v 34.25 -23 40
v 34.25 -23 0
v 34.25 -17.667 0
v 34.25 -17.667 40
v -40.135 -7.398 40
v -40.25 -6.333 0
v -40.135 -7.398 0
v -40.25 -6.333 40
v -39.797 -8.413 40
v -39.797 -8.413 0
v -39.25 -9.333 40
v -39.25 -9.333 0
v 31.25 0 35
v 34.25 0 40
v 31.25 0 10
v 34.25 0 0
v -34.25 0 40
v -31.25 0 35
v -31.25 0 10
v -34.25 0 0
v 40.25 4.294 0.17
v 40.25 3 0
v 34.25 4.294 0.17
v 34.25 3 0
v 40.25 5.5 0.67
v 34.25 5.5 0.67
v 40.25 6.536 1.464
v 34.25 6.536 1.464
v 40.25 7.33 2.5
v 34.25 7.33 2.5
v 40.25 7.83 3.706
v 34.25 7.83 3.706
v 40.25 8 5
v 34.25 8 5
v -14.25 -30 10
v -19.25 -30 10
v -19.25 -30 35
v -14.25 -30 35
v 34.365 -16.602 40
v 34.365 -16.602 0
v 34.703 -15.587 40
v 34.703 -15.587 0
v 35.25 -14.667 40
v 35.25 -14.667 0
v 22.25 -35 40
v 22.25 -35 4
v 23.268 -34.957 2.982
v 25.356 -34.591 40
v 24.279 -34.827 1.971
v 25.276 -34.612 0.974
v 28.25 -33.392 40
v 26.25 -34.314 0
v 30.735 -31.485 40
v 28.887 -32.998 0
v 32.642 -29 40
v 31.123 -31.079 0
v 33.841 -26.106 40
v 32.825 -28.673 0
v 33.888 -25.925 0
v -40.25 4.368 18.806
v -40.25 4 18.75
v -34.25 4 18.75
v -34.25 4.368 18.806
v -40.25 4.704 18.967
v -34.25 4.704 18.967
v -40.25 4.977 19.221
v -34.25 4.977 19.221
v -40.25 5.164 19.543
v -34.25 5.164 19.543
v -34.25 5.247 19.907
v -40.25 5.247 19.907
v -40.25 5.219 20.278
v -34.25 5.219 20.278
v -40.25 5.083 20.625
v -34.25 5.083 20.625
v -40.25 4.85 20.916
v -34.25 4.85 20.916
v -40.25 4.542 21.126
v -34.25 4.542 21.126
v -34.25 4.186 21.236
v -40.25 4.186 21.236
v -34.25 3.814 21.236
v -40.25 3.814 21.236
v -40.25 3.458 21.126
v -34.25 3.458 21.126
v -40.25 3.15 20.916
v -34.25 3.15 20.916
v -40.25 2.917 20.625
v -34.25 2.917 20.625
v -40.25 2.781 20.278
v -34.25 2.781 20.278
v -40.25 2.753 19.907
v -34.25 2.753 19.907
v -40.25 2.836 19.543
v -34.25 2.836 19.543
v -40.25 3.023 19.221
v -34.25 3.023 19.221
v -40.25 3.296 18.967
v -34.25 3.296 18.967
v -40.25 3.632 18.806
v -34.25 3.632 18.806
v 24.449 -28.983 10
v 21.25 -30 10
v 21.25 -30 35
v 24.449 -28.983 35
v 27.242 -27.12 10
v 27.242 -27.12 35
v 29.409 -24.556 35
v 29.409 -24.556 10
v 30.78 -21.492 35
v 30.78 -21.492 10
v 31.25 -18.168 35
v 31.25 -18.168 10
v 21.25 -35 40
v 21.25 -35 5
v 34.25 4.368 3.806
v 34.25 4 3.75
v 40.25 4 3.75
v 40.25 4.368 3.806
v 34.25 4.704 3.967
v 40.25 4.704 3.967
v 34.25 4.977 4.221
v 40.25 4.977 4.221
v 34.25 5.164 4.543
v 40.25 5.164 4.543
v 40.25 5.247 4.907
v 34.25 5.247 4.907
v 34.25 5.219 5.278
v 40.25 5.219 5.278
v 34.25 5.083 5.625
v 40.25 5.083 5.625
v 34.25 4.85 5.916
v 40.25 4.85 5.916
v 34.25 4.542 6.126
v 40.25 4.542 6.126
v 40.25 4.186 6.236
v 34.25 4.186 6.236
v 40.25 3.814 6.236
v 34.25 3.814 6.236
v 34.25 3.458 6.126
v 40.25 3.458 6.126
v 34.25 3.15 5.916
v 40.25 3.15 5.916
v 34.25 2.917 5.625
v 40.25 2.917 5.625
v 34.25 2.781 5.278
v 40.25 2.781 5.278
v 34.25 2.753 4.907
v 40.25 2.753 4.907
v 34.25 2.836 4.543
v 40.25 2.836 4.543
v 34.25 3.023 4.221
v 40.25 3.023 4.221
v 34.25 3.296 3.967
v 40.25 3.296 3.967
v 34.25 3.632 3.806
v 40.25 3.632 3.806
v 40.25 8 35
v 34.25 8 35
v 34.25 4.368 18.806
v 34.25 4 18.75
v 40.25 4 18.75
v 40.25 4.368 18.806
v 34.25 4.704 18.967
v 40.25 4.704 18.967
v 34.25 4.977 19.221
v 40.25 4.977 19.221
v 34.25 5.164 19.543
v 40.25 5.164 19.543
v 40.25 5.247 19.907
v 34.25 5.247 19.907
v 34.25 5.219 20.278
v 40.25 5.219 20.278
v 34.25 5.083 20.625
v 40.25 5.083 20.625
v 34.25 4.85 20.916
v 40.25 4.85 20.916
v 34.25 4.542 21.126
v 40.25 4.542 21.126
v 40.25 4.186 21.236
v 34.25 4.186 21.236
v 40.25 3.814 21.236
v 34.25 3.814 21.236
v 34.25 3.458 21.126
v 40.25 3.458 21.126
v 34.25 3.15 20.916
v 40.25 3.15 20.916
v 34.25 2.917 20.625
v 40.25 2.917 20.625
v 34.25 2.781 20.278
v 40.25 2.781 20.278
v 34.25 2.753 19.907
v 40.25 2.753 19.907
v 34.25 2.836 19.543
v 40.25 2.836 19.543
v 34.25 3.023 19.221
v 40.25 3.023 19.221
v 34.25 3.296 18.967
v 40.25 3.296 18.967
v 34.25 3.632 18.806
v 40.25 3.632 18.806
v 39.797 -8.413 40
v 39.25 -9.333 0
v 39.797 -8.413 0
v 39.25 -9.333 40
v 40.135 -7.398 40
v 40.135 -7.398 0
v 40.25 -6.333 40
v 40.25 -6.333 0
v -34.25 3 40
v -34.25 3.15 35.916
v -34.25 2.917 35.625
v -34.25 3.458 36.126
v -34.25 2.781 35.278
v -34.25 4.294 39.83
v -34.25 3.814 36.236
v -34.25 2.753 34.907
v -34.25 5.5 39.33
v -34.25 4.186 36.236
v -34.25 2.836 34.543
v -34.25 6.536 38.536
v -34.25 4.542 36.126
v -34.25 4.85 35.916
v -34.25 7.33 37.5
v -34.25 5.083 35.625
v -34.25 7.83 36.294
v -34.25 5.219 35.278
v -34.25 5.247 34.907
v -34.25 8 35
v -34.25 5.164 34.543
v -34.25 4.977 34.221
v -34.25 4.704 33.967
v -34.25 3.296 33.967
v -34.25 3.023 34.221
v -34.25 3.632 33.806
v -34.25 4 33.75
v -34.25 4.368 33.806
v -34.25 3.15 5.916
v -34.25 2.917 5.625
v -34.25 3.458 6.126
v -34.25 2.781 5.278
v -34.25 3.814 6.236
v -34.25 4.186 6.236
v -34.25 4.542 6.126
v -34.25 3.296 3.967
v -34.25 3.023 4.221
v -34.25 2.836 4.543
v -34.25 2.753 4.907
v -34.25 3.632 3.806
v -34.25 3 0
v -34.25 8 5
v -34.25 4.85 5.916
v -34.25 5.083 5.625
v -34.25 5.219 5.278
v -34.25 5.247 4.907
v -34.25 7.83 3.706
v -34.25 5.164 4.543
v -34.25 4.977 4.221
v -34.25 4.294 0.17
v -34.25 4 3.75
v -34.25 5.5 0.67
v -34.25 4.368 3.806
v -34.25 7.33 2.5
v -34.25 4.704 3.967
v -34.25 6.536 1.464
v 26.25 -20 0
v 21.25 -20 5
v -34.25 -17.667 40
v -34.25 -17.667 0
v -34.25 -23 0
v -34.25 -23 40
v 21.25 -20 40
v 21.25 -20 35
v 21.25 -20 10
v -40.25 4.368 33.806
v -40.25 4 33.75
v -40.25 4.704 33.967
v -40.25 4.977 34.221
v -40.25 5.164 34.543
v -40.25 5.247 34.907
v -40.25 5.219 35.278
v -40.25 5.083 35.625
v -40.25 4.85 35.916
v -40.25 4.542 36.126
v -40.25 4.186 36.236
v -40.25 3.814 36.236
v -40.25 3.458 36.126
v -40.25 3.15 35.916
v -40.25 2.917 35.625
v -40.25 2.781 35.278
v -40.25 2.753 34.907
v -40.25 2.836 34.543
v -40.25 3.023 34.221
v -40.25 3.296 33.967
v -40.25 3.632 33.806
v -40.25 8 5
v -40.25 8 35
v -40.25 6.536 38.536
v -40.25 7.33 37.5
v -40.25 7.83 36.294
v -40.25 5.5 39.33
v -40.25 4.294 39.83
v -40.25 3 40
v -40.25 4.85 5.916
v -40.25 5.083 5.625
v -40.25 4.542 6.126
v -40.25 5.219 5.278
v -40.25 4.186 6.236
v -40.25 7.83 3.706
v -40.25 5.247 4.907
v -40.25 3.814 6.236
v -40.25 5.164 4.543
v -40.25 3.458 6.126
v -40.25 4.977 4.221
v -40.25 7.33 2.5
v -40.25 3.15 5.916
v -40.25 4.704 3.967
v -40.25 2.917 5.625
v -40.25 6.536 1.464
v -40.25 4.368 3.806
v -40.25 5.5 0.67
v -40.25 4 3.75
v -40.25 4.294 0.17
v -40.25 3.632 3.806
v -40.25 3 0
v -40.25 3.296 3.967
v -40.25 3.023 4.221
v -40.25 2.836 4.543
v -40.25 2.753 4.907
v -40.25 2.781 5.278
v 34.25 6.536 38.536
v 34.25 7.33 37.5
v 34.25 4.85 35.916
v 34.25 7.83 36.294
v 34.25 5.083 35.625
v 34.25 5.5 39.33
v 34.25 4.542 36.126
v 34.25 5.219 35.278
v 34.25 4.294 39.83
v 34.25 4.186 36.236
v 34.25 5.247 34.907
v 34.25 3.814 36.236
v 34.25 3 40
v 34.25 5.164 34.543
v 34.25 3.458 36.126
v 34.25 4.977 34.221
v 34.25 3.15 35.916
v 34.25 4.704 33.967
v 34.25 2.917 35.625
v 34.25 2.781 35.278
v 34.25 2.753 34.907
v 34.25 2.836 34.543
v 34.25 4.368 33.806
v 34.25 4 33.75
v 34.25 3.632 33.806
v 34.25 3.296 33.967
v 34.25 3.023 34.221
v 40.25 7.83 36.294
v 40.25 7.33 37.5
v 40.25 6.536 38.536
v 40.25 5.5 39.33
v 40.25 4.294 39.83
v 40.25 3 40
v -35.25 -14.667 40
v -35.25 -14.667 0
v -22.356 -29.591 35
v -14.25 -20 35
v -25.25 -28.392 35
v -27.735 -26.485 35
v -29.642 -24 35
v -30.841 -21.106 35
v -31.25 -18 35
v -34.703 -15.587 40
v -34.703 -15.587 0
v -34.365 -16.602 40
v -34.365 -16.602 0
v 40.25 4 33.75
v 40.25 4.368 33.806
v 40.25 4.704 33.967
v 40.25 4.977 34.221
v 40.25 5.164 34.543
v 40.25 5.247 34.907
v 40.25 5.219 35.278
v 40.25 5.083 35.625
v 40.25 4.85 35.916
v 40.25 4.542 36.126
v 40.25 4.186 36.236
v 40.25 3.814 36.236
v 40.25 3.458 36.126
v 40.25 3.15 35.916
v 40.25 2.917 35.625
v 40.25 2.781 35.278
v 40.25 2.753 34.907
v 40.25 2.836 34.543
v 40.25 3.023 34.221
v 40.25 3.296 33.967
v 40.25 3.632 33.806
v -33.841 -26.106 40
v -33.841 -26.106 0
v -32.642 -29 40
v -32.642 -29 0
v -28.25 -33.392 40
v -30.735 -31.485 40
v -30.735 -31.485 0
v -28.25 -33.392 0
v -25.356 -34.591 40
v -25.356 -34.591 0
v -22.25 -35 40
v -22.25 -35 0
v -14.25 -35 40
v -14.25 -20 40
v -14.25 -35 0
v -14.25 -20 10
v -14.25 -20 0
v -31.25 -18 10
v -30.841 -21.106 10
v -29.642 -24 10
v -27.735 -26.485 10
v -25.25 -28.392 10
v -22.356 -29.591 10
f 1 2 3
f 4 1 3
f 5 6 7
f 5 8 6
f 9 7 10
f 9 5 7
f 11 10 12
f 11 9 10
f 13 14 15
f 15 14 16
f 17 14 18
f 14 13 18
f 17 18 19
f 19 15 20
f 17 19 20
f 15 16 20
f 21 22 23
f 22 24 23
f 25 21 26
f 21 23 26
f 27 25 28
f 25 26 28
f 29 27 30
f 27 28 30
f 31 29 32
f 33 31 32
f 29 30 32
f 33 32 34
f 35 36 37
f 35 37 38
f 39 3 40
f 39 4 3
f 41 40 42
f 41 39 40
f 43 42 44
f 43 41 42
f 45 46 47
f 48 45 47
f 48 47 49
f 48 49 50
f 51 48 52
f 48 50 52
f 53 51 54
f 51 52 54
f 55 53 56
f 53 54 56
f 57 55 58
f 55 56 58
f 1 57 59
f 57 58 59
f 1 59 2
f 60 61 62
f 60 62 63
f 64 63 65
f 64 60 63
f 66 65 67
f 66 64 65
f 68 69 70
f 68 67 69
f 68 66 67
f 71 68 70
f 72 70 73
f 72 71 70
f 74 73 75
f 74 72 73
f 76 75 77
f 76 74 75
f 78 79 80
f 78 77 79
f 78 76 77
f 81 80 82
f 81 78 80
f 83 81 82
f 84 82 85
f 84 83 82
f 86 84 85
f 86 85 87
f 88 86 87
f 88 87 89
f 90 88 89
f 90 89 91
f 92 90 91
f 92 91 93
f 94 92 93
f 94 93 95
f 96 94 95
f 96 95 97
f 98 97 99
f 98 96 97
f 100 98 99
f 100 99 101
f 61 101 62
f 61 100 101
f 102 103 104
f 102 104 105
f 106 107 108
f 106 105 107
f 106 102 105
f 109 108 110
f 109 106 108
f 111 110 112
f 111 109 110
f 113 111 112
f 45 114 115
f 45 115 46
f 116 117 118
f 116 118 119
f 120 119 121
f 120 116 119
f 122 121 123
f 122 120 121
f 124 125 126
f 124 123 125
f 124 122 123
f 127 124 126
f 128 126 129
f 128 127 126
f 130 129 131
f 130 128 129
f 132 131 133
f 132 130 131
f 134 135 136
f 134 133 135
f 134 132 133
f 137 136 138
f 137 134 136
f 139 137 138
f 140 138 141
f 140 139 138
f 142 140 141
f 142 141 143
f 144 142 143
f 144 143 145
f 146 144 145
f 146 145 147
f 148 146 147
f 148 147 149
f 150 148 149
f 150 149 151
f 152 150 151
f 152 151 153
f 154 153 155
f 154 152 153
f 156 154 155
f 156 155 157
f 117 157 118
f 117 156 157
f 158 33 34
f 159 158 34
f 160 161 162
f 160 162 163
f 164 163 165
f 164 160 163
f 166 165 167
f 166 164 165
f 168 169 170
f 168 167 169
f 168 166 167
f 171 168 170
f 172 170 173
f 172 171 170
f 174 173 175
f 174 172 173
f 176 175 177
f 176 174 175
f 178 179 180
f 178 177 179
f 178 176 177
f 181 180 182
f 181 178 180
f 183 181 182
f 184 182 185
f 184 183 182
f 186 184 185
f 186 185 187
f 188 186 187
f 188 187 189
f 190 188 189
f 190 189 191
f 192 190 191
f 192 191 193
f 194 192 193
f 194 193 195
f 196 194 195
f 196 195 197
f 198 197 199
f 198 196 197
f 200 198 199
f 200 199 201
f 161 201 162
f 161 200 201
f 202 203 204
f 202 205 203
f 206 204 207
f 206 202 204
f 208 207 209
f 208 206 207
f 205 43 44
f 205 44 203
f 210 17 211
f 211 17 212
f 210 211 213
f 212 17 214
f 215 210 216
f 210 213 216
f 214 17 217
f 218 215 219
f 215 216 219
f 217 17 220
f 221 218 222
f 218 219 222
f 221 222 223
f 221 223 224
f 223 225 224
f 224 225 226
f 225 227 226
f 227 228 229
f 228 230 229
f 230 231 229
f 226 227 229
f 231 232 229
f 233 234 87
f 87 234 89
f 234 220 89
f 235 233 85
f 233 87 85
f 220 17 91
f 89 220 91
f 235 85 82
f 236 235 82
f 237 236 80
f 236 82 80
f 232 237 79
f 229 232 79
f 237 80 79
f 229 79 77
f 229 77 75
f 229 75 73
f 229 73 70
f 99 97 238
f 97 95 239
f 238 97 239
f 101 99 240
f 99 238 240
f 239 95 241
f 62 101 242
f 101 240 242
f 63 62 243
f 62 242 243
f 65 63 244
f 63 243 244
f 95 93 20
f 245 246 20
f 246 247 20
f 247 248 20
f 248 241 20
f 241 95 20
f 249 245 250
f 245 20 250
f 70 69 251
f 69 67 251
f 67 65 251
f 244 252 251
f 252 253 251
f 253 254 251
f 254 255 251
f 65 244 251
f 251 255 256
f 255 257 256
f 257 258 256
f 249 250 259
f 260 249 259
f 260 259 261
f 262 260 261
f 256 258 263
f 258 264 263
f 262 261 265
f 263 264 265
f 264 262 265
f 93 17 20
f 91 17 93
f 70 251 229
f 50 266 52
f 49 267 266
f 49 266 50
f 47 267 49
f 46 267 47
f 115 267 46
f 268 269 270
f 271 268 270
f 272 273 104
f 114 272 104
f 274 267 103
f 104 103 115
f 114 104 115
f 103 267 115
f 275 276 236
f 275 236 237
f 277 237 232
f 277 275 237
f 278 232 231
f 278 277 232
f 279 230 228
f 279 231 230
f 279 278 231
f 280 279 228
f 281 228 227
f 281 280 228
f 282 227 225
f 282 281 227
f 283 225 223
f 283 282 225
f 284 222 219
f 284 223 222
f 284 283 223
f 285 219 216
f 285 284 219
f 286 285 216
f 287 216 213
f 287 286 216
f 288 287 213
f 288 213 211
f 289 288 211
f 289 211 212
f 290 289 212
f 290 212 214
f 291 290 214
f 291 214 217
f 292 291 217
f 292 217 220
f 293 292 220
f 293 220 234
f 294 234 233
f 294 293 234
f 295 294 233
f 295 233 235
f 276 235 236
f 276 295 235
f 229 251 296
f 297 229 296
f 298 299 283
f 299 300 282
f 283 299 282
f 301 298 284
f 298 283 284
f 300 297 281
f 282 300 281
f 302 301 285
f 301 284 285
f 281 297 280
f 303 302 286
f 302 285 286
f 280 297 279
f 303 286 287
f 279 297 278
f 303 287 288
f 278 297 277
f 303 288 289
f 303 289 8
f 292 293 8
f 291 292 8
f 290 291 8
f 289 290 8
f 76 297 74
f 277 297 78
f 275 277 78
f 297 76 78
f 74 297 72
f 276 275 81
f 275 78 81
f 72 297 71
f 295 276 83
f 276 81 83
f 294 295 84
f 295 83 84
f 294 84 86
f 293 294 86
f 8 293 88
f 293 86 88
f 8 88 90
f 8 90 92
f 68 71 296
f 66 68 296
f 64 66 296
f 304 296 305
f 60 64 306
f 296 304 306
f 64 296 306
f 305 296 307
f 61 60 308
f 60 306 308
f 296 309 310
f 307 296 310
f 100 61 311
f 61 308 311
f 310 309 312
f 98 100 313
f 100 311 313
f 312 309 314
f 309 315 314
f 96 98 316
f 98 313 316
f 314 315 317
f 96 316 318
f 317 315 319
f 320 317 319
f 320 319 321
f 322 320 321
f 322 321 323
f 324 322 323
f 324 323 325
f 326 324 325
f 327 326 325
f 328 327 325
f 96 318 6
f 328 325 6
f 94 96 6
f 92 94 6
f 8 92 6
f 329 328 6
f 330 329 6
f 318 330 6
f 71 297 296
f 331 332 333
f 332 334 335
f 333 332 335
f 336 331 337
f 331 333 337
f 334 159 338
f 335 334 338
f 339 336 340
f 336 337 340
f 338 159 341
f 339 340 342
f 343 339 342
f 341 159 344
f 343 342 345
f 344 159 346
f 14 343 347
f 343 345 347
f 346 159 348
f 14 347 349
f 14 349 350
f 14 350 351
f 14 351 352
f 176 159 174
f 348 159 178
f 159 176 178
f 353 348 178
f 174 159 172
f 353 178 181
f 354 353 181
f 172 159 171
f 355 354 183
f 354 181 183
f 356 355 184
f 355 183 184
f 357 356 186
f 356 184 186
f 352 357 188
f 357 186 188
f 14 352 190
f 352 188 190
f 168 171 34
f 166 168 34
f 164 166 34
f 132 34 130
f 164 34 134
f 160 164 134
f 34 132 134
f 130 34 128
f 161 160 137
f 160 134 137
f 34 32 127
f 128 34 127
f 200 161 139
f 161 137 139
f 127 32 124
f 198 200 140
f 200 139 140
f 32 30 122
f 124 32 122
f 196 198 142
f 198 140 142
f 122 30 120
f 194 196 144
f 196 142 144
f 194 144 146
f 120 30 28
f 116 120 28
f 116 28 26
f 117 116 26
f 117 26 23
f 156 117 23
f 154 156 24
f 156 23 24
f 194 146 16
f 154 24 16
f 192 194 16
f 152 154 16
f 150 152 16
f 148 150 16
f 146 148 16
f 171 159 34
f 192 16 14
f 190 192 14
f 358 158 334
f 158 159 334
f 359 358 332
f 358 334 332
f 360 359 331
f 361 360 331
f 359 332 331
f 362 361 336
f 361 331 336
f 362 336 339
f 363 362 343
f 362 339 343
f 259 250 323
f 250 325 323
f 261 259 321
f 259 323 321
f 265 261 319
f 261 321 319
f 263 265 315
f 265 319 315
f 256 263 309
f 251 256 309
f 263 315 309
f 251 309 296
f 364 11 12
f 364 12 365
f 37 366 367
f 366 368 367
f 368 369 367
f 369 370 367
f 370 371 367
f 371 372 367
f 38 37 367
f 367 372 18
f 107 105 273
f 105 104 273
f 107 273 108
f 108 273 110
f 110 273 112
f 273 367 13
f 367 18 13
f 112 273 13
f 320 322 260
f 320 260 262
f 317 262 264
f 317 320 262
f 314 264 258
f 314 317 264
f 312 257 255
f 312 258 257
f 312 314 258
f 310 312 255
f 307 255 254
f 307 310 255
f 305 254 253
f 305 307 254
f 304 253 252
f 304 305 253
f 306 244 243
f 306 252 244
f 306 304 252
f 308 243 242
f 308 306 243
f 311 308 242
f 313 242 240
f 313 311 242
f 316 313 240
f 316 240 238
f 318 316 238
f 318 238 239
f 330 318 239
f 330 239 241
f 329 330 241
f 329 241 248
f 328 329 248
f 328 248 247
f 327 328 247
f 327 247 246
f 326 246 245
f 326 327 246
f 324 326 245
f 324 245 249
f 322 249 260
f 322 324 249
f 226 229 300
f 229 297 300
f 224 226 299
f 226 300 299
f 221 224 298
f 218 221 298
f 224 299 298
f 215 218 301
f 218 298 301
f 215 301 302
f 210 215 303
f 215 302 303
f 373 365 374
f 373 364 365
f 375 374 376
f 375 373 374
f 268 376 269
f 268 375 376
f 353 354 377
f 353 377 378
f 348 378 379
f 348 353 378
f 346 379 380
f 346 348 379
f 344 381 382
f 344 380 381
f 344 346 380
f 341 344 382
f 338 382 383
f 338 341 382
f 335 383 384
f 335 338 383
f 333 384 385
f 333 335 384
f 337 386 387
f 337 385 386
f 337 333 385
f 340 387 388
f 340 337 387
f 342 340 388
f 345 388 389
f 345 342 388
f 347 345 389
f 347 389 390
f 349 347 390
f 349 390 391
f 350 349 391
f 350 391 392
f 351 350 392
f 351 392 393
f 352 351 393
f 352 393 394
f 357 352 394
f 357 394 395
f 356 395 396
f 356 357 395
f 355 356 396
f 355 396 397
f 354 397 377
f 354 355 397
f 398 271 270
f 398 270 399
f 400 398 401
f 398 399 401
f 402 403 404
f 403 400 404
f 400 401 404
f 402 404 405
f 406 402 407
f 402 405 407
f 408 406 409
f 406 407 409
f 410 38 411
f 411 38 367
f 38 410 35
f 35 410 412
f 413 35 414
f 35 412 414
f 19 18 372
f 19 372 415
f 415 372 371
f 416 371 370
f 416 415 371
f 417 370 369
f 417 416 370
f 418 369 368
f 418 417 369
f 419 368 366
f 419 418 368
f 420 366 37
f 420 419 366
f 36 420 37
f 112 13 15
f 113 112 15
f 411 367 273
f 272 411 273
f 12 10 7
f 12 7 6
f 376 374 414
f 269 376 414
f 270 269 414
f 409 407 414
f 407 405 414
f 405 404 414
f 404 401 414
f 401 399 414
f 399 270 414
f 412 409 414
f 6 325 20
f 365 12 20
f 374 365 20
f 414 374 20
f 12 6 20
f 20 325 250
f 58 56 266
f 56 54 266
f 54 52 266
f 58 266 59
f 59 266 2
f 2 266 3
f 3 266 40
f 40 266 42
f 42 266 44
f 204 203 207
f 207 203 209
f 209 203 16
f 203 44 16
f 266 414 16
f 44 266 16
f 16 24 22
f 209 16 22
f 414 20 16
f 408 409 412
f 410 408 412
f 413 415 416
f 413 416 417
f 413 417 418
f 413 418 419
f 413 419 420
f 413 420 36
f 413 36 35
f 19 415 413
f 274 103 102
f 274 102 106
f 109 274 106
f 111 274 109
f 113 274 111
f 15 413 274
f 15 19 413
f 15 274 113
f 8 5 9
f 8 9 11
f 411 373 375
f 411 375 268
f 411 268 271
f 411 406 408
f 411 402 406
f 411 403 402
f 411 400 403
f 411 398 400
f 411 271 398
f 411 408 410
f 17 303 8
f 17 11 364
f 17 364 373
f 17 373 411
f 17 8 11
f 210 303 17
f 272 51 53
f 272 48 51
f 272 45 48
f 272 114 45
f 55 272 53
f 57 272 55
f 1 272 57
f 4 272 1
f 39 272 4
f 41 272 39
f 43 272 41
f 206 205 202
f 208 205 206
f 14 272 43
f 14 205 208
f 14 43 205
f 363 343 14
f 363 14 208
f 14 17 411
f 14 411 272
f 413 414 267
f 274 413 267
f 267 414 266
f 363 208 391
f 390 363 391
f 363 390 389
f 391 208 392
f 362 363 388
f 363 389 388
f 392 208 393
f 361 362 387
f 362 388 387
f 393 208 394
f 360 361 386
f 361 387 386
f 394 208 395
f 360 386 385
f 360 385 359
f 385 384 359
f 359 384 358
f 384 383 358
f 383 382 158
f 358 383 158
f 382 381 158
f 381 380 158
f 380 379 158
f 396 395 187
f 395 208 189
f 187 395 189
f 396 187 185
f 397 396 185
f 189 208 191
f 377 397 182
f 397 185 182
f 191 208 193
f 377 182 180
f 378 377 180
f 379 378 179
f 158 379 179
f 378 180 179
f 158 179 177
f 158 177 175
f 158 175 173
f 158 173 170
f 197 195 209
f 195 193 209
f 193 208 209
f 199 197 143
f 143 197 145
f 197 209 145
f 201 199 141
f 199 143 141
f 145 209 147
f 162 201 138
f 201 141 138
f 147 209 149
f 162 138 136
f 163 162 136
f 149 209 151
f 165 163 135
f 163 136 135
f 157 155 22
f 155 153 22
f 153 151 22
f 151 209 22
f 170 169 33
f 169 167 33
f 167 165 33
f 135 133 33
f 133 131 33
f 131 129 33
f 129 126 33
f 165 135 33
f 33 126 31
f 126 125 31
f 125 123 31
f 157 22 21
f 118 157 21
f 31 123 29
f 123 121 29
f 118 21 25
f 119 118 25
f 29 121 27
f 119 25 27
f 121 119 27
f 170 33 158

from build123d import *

# Parameters (mm, degrees)
BOSS_EXTRUDE1_DEPTH     = 40
SKETCH2_W               = 35.5
SKETCH2_H               = 25
CUT_EXTRUDE1_DEPTH      = 40
CUT_EXTRUDE2_DEPTH      = 67.671301922
CUT_EXTRUDE2_DEPTH_BACK = 67.671301922
SKETCH3_R               = 1.25
FILLET2_R               = 5
CHAMFER1_SIZE           = 5
SKETCH4_W               = 17
SKETCH4_H               = 25
SKETCH4_W_2             = 10
CUT_EXTRUDE3_DEPTH      = 30
FILLET3_R               = 12


with BuildPart() as part:
    # Sketch1 → Boss-Extrude1 (new body)
    with BuildSketch(Plane.XY):
        Polygon((-14.25, -20), (21.25, -20), (21.25, -35), (34.25, -35), (34.25, 0), (-34.25, 0), (-34.25, -35), (-14.25, -35), align=None)
        Polygon((-34.25, -16), (-34.25, 0), (-34.25, 8), (-40.25, 8), (-40.25, -8), align=None)
        Polygon((34.25, 8), (34.25, 0), (34.25, -16), (40.25, -8), (40.25, 8), align=None)
    extrude(amount=BOSS_EXTRUDE1_DEPTH)

    # Sketch2 → Cut-Extrude1 (cut)
    with BuildSketch(Plane(origin=(0, 0, 0), x_dir=(1, 0, 0), z_dir=(0, 1, 0))):
        with Locations((3.5, -22.5)):
            Rectangle(SKETCH2_W, SKETCH2_H)
    extrude(amount=-CUT_EXTRUDE1_DEPTH, mode=Mode.SUBTRACT)

    # Sketch3 → Cut-Extrude2 (cut, two sides: drawn at the far end of the back side and taken through both)
    with BuildSketch(Plane(origin=(0, 0, 0), x_dir=(0, 0, -1), z_dir=(1, 0, 0)).offset(-CUT_EXTRUDE2_DEPTH_BACK)):
        with Locations((-35, 4)):
            Circle(SKETCH3_R)
        with Locations((-5, 4)):
            Circle(SKETCH3_R)
        with Locations((-20, 4)):
            Circle(SKETCH3_R)
    extrude(amount=CUT_EXTRUDE2_DEPTH + CUT_EXTRUDE2_DEPTH_BACK, mode=Mode.SUBTRACT)

    # Fillet2
    fillet2_edges = [part.edges().sort_by_distance(p)[0] for p in [
        (-37.25, 8, 0),
        (37.25, 8, 0),
        (37.25, 8, 40),
        (-34.25, -16, 20),
        (-40.25, -8, 20),
        (40.25, -8, 20),
        (34.25, -16, 20),
        (-37.25, 8, 40),
    ]]
    fillet(fillet2_edges, radius=FILLET2_R)

    # Chamfer1
    chamfer1_edges = [part.edges().sort_by_distance(p)[0] for p in [
        (21.25, -27.5, 0),
    ]]
    chamfer(chamfer1_edges, length=CHAMFER1_SIZE)

    # Sketch4 → Cut-Extrude3 (cut)
    with BuildSketch(Plane(origin=(0, 0, 0), x_dir=(1, 0, 0), z_dir=(0, 1, 0))):
        with Locations((-22.75, -22.5)):
            Rectangle(SKETCH4_W, SKETCH4_H)
        with Locations((26.25, -22.5)):
            Rectangle(SKETCH4_W_2, SKETCH4_H)
    extrude(amount=-CUT_EXTRUDE3_DEPTH, mode=Mode.SUBTRACT)

    # Fillet3
    # the kernel refuses this fillet: 12 mm, written as the material it adds along each edge
    with BuildSketch(Plane(origin=(-31.25, -30, 10), x_dir=(0, 1, 0), z_dir=(0, 0, 1))) as fillet3_piece_1_section:
        with BuildLine():
            CenterArc((FILLET3_R, -FILLET3_R), FILLET3_R, 90, 90)
            Line((0, -FILLET3_R), (0, 0))
            Line((0, 0), (FILLET3_R, 0))
        make_face()
    fillet3_piece_1 = extrude(amount=55, mode=Mode.PRIVATE)
    fillet3_piece_1 = split(fillet3_piece_1, bisect_by=Plane(origin=(-31.25, -30, 40), z_dir=(0, 0, -1)), keep=Keep.TOP, mode=Mode.PRIVATE)
    add(fillet3_piece_1)
    with BuildSketch(Plane(origin=(31.25, -30, 10), x_dir=(0, 1, 0), z_dir=(0, 0, 1))) as fillet3_piece_2_section:
        with BuildLine():
            CenterArc((11.832159566, 12), FILLET3_R, 189.594068227, 80.405931773)
            Line((0, 10), (0, 0))
            Line((0, 0), (11.832159566, 0))
        make_face()
    fillet3_piece_2 = extrude(amount=54.580398916, mode=Mode.PRIVATE)
    fillet3_piece_2 = split(fillet3_piece_2, bisect_by=Plane(origin=(31.25, -30, 40), z_dir=(0, 0, -1)), keep=Keep.TOP, mode=Mode.PRIVATE)
    add(fillet3_piece_2)
    # the kernel refuses this fillet: 12 mm, written as the material it takes off along each edge
    with BuildSketch(Plane(origin=(-34.25, -35, -30), x_dir=(1, 0, 0), z_dir=(0, 0, 1)), Plane(origin=(34.25, -35, -30), x_dir=(0, 1, 0), z_dir=(0, 0, 1))) as fillet3_2_piece_1:
        with BuildLine():
            CenterArc((FILLET3_R, FILLET3_R), FILLET3_R, 180, 90)
            Line((0, FILLET3_R), (0, 0))
            Line((0, 0), (FILLET3_R, 0))
        make_face()
    extrude(amount=100, mode=Mode.SUBTRACT)


solid = part.part
